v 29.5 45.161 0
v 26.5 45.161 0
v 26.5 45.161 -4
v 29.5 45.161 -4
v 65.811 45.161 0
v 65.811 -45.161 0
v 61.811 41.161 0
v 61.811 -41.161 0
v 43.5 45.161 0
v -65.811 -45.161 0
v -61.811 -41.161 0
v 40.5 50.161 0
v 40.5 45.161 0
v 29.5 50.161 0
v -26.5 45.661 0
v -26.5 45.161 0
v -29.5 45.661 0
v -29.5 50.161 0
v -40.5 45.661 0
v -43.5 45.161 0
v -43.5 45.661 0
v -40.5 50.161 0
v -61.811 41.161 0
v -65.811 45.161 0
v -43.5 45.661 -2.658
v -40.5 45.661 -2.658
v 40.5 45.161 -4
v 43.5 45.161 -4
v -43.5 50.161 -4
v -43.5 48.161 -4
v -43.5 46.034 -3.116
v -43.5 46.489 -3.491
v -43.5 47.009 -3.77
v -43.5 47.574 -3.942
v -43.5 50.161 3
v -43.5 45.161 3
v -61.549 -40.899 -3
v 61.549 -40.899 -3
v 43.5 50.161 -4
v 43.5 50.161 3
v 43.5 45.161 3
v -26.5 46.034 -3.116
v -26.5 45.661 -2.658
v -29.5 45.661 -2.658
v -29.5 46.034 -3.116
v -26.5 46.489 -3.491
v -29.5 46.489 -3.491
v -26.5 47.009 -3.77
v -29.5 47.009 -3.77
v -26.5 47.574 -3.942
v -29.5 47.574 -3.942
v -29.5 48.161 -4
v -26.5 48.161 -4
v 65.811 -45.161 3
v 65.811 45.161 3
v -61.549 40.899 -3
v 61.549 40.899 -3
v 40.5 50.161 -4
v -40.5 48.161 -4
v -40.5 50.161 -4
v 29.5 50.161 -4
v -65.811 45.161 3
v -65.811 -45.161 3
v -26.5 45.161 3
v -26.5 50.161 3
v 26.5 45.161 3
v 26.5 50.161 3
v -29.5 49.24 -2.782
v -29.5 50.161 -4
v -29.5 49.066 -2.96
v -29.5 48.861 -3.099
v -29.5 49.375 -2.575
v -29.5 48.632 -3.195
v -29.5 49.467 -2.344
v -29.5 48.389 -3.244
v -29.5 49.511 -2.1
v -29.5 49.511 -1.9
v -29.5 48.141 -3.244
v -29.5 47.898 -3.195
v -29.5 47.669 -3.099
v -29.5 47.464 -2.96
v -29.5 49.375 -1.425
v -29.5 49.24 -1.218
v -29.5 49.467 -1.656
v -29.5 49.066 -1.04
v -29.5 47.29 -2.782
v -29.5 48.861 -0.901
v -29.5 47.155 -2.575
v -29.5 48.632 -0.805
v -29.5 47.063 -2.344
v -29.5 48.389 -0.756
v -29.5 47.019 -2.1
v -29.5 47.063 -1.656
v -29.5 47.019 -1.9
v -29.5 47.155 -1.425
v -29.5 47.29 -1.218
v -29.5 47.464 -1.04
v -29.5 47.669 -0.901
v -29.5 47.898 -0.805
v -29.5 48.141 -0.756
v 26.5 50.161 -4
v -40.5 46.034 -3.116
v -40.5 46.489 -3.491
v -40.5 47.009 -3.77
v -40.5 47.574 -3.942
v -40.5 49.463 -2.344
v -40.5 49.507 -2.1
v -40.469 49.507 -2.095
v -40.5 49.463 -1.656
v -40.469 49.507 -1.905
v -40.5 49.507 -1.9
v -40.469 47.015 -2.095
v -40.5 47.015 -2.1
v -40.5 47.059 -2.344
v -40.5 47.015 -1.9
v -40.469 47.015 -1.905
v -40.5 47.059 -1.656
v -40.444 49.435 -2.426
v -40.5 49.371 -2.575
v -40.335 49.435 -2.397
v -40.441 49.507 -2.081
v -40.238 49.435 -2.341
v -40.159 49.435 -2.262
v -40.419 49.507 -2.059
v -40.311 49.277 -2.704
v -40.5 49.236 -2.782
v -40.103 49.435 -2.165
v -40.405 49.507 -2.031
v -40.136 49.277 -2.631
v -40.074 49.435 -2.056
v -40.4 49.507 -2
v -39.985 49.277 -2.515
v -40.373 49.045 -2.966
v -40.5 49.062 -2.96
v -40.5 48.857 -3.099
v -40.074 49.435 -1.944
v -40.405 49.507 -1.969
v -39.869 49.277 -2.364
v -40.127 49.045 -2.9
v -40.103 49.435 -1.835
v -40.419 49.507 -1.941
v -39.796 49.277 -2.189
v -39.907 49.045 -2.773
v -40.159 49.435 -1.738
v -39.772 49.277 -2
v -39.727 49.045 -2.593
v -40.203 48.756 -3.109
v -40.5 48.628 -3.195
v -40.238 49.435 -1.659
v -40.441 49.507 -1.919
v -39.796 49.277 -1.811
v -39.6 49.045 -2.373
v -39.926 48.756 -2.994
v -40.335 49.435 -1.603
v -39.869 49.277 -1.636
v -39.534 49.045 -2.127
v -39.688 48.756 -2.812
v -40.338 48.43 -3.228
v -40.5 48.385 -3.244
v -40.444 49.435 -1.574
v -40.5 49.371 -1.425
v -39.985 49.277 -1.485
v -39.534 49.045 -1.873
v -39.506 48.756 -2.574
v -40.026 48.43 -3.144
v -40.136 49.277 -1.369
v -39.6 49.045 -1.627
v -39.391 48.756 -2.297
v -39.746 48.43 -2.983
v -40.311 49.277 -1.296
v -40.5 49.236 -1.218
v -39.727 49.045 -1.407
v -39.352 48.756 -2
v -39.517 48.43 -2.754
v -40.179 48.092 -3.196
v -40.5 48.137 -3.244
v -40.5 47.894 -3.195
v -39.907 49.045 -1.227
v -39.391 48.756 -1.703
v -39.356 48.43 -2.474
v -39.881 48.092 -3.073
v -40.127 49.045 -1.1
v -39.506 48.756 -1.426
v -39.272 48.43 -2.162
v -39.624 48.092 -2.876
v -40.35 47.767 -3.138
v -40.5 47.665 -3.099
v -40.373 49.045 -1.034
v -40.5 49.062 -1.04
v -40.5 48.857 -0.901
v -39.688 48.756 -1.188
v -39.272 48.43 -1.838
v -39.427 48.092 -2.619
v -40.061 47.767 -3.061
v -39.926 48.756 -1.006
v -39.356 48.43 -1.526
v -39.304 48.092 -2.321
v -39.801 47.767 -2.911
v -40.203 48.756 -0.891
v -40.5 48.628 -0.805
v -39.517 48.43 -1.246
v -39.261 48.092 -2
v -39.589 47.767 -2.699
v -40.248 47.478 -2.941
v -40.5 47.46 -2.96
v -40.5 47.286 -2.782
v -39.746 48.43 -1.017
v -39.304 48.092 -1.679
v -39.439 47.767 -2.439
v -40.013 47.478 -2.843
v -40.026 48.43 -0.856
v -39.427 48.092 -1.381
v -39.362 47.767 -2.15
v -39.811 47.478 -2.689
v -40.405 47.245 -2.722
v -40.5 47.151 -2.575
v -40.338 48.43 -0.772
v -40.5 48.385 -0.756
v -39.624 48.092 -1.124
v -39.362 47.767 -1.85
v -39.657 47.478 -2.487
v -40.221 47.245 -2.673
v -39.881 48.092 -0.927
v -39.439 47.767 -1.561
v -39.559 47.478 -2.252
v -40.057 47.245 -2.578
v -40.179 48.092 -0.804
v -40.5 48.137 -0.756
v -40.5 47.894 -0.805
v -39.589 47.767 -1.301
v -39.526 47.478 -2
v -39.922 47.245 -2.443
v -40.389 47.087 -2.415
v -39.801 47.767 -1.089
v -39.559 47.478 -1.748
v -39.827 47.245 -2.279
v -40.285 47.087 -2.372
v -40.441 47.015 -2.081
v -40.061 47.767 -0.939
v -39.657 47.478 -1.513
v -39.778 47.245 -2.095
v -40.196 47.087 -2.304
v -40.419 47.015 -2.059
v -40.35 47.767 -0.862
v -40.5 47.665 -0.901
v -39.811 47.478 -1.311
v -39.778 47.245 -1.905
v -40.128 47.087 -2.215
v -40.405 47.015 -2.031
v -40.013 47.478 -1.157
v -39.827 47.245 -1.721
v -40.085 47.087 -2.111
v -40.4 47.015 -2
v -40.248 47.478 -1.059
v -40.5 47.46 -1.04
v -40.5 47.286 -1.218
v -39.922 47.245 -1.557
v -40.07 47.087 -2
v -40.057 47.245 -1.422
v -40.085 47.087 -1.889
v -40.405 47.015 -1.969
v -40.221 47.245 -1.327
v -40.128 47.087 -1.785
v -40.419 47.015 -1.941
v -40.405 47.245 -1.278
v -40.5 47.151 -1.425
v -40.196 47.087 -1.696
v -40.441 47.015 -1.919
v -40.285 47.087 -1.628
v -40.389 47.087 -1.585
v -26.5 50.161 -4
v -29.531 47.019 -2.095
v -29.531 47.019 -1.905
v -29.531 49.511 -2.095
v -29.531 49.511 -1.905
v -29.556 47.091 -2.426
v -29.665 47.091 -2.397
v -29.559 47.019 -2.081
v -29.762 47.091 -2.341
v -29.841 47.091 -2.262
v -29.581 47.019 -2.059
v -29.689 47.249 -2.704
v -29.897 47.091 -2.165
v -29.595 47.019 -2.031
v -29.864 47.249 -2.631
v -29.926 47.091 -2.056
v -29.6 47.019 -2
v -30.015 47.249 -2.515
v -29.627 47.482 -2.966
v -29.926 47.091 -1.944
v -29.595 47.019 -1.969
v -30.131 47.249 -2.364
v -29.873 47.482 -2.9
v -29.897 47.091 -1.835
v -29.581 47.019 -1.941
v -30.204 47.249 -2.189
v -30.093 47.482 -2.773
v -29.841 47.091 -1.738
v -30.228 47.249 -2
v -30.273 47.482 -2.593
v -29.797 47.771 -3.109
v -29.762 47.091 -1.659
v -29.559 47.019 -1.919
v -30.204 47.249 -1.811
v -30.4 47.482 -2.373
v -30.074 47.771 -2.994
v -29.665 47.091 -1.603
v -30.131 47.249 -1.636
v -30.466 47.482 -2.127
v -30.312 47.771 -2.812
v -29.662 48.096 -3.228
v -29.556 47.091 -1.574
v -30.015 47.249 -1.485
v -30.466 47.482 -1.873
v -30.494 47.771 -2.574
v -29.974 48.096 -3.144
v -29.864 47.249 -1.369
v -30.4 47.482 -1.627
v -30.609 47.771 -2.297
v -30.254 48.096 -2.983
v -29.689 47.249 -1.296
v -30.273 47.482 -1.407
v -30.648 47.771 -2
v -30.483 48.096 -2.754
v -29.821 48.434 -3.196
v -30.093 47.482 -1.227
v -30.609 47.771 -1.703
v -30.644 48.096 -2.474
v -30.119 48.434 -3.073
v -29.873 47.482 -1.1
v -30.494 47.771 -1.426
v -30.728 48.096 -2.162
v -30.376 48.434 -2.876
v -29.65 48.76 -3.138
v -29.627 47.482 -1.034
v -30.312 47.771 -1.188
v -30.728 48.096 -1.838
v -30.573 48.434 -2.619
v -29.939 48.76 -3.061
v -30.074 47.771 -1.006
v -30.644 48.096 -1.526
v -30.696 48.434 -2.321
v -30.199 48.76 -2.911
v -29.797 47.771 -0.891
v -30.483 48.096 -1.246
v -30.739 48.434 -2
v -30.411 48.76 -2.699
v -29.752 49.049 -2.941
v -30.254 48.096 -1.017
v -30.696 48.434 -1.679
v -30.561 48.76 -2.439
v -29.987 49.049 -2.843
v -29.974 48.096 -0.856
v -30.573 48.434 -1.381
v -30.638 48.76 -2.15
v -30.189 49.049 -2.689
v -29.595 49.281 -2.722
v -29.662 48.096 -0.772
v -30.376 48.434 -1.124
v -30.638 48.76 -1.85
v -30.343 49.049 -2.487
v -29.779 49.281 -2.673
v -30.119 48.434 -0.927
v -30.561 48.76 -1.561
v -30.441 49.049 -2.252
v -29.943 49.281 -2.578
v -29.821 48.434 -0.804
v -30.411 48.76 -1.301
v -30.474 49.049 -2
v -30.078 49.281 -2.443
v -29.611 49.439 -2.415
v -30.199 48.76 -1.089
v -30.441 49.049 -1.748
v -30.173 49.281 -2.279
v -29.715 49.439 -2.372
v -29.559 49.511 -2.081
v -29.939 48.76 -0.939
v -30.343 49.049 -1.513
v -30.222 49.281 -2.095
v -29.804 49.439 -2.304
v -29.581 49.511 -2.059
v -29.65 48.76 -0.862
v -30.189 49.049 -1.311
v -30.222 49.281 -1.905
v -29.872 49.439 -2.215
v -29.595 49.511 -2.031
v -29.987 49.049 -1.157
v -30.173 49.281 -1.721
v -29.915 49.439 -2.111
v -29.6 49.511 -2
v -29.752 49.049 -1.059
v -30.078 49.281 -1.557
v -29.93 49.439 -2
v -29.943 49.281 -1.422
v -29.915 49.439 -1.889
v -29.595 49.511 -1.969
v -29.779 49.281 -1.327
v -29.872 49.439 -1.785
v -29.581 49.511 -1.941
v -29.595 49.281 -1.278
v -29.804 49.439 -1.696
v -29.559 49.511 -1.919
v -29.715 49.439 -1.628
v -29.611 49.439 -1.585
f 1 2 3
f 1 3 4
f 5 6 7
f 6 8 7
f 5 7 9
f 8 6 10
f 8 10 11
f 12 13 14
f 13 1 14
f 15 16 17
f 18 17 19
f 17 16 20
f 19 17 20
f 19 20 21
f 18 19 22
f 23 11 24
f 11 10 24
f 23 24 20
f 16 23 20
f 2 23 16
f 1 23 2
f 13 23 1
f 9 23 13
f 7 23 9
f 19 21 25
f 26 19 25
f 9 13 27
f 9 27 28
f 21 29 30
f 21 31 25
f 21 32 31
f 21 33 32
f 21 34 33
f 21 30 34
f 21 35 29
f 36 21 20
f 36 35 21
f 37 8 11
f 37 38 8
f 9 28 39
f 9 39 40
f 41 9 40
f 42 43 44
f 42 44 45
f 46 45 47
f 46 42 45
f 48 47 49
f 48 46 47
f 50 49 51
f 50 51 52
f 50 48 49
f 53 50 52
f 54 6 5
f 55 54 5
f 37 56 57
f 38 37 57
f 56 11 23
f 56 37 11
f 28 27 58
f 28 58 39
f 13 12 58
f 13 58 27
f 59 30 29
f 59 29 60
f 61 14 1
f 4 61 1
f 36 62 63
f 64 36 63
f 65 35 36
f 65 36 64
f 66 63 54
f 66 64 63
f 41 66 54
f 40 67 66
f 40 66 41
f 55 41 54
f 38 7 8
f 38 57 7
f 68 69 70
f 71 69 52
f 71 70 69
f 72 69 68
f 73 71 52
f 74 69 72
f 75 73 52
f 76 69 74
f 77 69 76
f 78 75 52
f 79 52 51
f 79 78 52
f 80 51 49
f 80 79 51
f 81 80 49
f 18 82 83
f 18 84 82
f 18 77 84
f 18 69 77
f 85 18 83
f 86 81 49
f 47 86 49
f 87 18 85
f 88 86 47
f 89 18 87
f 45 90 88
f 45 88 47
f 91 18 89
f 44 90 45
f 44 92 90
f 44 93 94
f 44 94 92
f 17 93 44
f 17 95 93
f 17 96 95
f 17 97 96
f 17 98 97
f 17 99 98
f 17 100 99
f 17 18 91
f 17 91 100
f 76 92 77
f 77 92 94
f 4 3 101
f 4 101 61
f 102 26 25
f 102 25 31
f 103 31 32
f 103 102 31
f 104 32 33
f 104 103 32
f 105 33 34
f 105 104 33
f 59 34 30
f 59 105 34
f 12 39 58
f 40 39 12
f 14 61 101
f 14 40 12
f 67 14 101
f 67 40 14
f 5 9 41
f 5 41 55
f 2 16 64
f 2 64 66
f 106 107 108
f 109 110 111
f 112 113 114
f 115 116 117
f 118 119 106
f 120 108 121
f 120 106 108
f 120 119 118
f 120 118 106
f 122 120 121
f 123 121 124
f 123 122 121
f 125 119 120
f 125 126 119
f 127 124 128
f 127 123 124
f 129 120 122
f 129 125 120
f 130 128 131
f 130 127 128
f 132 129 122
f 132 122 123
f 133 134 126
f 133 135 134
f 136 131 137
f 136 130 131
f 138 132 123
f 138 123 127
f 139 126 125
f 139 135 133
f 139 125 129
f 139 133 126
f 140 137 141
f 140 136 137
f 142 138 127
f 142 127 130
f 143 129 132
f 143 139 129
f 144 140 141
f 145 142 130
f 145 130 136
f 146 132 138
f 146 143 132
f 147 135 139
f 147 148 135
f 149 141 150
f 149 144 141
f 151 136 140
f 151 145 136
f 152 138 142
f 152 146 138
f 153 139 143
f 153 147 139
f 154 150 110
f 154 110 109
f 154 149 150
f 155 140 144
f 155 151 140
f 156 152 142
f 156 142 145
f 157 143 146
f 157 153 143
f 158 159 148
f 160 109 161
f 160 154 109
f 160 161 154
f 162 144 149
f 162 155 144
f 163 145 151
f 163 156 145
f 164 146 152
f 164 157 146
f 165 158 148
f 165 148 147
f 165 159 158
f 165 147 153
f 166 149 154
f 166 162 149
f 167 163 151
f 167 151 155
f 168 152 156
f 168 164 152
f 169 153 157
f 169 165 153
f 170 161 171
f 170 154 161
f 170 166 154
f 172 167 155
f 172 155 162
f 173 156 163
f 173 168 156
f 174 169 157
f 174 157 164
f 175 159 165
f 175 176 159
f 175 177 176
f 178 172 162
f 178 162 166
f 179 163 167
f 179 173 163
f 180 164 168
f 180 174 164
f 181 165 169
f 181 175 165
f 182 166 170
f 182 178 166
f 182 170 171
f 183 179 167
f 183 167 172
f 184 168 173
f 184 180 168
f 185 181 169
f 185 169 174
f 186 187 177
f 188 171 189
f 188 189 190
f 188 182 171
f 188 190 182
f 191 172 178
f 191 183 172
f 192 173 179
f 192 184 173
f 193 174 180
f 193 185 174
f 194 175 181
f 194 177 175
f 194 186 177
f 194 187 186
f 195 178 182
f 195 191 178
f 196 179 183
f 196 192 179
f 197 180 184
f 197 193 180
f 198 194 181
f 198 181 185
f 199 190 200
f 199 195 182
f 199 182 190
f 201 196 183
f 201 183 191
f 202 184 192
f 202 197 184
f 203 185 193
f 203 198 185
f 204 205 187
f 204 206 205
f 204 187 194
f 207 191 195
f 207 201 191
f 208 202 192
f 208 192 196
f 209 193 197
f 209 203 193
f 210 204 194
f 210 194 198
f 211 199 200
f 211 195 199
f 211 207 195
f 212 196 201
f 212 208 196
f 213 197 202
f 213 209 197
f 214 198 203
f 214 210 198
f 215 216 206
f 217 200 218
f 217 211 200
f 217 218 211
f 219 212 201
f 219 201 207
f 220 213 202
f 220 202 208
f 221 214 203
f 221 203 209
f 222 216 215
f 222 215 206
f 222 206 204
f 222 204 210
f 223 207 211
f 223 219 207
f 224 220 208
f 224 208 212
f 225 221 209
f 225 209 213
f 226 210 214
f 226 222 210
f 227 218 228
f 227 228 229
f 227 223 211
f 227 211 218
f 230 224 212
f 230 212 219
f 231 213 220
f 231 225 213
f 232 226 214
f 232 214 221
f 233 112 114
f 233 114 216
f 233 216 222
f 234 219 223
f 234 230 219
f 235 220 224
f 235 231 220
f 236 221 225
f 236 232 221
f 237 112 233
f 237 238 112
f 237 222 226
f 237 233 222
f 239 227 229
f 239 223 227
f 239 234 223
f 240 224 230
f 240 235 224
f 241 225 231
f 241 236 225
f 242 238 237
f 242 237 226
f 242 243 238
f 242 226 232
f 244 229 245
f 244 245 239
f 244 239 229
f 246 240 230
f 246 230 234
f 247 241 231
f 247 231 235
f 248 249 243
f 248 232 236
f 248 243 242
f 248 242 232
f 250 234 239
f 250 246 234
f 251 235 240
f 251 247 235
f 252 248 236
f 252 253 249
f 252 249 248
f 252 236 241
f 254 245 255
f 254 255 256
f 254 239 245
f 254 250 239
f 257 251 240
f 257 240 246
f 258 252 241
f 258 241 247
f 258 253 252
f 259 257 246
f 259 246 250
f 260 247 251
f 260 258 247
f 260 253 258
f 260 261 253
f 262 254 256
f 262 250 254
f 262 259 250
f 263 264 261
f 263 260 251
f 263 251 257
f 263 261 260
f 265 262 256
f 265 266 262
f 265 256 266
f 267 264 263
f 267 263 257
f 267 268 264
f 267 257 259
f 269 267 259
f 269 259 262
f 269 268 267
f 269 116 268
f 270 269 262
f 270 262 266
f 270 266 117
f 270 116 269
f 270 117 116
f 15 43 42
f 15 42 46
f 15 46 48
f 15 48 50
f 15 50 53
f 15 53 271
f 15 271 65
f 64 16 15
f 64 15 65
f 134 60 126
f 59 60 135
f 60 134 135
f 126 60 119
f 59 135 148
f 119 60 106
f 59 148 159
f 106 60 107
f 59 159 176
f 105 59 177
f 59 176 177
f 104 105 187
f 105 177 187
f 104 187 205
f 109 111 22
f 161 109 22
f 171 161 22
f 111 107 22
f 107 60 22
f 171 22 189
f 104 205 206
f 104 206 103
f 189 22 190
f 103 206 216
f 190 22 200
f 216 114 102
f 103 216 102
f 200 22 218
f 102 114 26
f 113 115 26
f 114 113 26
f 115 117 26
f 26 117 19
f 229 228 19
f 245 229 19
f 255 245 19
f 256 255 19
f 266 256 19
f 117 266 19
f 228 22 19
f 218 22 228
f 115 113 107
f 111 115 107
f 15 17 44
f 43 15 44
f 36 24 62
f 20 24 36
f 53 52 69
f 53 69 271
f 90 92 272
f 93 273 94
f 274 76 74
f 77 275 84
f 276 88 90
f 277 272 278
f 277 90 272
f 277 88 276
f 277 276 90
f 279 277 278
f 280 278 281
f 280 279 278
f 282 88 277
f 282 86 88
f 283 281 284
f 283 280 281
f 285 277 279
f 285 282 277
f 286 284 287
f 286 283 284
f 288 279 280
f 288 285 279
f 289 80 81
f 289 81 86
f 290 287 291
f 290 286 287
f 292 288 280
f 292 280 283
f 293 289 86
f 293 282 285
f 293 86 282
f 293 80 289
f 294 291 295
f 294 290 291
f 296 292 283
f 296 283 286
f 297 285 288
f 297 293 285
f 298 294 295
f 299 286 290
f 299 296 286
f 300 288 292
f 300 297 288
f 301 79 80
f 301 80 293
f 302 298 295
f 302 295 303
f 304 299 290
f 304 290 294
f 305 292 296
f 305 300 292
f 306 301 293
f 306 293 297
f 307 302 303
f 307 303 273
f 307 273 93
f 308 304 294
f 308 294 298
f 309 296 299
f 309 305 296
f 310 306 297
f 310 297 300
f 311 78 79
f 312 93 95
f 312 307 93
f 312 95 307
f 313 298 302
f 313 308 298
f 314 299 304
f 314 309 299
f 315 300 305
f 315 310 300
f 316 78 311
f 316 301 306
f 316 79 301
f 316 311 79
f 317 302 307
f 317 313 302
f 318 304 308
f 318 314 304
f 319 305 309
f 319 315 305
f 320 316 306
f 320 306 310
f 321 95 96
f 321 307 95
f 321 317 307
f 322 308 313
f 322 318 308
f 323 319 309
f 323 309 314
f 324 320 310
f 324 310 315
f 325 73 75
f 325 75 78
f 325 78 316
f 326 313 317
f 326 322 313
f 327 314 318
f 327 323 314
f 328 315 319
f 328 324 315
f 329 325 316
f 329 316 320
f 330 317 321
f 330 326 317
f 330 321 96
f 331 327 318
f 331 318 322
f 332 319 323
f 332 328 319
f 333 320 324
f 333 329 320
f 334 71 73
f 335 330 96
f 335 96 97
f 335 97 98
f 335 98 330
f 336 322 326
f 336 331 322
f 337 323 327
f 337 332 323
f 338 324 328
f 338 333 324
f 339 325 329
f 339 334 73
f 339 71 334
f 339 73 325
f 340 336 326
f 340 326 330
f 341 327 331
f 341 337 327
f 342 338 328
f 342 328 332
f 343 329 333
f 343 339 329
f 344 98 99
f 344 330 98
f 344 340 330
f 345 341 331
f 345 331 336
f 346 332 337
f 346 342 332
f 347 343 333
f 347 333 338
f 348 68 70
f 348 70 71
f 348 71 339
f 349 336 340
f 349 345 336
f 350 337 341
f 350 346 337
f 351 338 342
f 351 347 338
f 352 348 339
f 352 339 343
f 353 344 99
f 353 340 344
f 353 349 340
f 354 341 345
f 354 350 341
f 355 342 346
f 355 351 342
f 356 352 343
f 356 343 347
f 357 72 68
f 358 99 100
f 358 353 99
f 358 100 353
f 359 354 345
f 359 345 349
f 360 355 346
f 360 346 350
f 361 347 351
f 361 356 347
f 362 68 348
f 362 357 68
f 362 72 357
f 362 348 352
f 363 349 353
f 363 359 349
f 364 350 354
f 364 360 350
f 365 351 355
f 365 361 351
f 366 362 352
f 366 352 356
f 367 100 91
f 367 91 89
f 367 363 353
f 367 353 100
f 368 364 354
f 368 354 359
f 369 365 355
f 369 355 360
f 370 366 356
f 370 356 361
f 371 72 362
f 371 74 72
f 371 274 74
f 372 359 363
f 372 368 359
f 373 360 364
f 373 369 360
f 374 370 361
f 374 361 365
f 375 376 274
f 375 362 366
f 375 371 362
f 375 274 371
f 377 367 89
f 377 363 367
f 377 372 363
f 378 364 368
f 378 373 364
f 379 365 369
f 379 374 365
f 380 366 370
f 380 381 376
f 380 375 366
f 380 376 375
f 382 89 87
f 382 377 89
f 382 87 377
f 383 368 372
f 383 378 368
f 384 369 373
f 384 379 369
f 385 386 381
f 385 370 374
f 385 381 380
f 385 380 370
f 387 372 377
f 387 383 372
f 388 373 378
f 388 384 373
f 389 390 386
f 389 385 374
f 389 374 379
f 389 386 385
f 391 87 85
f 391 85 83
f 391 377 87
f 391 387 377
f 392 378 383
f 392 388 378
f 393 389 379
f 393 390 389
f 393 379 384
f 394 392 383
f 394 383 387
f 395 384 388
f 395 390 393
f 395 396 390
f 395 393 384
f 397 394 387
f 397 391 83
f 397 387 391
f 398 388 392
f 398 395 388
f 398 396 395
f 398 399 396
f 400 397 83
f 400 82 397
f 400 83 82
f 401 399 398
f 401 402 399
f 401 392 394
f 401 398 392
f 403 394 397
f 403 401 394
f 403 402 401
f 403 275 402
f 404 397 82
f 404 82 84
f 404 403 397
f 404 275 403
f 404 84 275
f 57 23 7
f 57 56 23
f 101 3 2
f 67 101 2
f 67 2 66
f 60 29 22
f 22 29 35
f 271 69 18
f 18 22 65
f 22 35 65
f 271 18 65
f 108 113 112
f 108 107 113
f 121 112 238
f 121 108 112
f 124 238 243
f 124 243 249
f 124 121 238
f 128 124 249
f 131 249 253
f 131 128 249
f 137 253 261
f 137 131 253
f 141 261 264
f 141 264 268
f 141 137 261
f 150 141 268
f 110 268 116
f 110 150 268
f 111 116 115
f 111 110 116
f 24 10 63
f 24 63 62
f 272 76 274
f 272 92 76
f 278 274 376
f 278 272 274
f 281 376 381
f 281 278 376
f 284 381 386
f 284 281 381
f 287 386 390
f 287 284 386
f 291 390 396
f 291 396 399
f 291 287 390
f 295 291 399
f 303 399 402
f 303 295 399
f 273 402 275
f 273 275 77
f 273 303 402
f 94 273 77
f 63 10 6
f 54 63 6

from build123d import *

# Parameters (mm, degrees)
F0_W      = 131.6228
F0_H      = 90.3224
F1_DEPTH  = 3
F2_W      = 123.6228
F2_H      = 82.3224
F3_DEPTH  = 3
F3_TAPER  = 5
F4_W      = 17
F4_H      = 3
F5_DEPTH  = 5
F6_W      = 3
F6_H      = 5
F7_DEPTH  = 4
F8_R      = 3
F10_DEPTH = 25


with BuildPart() as f1:
    # F0 (on Top) → F1 (new body)
    with BuildSketch(Plane.XY):
        Rectangle(F0_W, F0_H)
    extrude(amount=F1_DEPTH)

    # F2 (on face) → F3 (join)
    with BuildSketch(Plane(origin=(0, 0, 0), x_dir=(1, 0, 0), z_dir=(0, 0, -1))):
        Rectangle(F2_W, F2_H)
    extrude(amount=F3_DEPTH, taper=F3_TAPER)

    # F4 (on face) → F5 (join)
    with BuildSketch(Plane(origin=(0, 45.1612, 0), x_dir=(-1, 0, 0), z_dir=(0, 1, 0))):
        with Locations((35, 1.5)):
            Rectangle(F4_W, F4_H)
        with Locations((-35, 1.5)):
            Rectangle(F4_W, F4_H)
    extrude(amount=F5_DEPTH)

    # F6 (on face) → F7 (join)
    with BuildSketch(Plane(origin=(0, 0, 0), x_dir=(1, 0, 0), z_dir=(0, 0, -1))):
        with Locations((-42, -47.6612)):
            Rectangle(F6_W, F6_H)
        with Locations((-28, -47.6612)):
            Rectangle(F6_W, F6_H)
        with Locations((28, -47.6612)):
            Rectangle(F6_W, F6_H)
        with Locations((42, -47.6612)):
            Rectangle(F6_W, F6_H)
    extrude(amount=F7_DEPTH)

    # F8
    f8_edges = [f1.edges().sort_by_distance(p)[0] for p in [
        (-42, 45.1612, -4),
        (-28, 45.1612, -4),
    ]]
    fillet(f8_edges, radius=F8_R)

    # F9 (on face) → F10 (cut)
    with BuildSketch(Plane(origin=(-43.5, 0, 0), x_dir=(0, -1, 0), z_dir=(-1, 0, 0))):
        with BuildLine():
            Line((-45.1612, -1), (-45.1612, 0))
            Line((-45.1612, 0), (-45.6612, 0))
            Line((-45.6612, 0), (-45.6612, -2.6583123952))
            ThreePointArc((-45.6612, -2.6583123952), (-45.2889186767, -1.8660254038), (-45.1612, -1))
        make_face()
    extrude(amount=-F10_DEPTH, mode=Mode.SUBTRACT)

    # F11 (on face) → F12 (revolve)
    with BuildSketch(Plane.YZ.offset(-40.5)):
        with BuildLine():
            Line((47.0152064206, -1.9), (49.5071935794, -1.9))
            ThreePointArc((49.5071935794, -1.9), (48.2612, -0.75), (47.0152064206, -1.9))
        make_face()
    revolve(axis=Axis((-40.5, 47.9112, -2), (0, -1, 0)))

    # F13 (on face) → F14 (revolve)
    with BuildSketch(Plane(origin=(-29.5, 0, 0), x_dir=(0, -1, 0), z_dir=(-1, 0, 0))):
        with BuildLine():
            Line((-49.5112, -1.9), (-47.0192128411, -1.9))
            ThreePointArc((-47.0192128411, -1.9), (-48.2652064206, -0.75), (-49.5112, -1.9))
        make_face()
    revolve(axis=Axis((-29.5, 47.9112, -2), (0, 1, 0)))


solid = f1.part
